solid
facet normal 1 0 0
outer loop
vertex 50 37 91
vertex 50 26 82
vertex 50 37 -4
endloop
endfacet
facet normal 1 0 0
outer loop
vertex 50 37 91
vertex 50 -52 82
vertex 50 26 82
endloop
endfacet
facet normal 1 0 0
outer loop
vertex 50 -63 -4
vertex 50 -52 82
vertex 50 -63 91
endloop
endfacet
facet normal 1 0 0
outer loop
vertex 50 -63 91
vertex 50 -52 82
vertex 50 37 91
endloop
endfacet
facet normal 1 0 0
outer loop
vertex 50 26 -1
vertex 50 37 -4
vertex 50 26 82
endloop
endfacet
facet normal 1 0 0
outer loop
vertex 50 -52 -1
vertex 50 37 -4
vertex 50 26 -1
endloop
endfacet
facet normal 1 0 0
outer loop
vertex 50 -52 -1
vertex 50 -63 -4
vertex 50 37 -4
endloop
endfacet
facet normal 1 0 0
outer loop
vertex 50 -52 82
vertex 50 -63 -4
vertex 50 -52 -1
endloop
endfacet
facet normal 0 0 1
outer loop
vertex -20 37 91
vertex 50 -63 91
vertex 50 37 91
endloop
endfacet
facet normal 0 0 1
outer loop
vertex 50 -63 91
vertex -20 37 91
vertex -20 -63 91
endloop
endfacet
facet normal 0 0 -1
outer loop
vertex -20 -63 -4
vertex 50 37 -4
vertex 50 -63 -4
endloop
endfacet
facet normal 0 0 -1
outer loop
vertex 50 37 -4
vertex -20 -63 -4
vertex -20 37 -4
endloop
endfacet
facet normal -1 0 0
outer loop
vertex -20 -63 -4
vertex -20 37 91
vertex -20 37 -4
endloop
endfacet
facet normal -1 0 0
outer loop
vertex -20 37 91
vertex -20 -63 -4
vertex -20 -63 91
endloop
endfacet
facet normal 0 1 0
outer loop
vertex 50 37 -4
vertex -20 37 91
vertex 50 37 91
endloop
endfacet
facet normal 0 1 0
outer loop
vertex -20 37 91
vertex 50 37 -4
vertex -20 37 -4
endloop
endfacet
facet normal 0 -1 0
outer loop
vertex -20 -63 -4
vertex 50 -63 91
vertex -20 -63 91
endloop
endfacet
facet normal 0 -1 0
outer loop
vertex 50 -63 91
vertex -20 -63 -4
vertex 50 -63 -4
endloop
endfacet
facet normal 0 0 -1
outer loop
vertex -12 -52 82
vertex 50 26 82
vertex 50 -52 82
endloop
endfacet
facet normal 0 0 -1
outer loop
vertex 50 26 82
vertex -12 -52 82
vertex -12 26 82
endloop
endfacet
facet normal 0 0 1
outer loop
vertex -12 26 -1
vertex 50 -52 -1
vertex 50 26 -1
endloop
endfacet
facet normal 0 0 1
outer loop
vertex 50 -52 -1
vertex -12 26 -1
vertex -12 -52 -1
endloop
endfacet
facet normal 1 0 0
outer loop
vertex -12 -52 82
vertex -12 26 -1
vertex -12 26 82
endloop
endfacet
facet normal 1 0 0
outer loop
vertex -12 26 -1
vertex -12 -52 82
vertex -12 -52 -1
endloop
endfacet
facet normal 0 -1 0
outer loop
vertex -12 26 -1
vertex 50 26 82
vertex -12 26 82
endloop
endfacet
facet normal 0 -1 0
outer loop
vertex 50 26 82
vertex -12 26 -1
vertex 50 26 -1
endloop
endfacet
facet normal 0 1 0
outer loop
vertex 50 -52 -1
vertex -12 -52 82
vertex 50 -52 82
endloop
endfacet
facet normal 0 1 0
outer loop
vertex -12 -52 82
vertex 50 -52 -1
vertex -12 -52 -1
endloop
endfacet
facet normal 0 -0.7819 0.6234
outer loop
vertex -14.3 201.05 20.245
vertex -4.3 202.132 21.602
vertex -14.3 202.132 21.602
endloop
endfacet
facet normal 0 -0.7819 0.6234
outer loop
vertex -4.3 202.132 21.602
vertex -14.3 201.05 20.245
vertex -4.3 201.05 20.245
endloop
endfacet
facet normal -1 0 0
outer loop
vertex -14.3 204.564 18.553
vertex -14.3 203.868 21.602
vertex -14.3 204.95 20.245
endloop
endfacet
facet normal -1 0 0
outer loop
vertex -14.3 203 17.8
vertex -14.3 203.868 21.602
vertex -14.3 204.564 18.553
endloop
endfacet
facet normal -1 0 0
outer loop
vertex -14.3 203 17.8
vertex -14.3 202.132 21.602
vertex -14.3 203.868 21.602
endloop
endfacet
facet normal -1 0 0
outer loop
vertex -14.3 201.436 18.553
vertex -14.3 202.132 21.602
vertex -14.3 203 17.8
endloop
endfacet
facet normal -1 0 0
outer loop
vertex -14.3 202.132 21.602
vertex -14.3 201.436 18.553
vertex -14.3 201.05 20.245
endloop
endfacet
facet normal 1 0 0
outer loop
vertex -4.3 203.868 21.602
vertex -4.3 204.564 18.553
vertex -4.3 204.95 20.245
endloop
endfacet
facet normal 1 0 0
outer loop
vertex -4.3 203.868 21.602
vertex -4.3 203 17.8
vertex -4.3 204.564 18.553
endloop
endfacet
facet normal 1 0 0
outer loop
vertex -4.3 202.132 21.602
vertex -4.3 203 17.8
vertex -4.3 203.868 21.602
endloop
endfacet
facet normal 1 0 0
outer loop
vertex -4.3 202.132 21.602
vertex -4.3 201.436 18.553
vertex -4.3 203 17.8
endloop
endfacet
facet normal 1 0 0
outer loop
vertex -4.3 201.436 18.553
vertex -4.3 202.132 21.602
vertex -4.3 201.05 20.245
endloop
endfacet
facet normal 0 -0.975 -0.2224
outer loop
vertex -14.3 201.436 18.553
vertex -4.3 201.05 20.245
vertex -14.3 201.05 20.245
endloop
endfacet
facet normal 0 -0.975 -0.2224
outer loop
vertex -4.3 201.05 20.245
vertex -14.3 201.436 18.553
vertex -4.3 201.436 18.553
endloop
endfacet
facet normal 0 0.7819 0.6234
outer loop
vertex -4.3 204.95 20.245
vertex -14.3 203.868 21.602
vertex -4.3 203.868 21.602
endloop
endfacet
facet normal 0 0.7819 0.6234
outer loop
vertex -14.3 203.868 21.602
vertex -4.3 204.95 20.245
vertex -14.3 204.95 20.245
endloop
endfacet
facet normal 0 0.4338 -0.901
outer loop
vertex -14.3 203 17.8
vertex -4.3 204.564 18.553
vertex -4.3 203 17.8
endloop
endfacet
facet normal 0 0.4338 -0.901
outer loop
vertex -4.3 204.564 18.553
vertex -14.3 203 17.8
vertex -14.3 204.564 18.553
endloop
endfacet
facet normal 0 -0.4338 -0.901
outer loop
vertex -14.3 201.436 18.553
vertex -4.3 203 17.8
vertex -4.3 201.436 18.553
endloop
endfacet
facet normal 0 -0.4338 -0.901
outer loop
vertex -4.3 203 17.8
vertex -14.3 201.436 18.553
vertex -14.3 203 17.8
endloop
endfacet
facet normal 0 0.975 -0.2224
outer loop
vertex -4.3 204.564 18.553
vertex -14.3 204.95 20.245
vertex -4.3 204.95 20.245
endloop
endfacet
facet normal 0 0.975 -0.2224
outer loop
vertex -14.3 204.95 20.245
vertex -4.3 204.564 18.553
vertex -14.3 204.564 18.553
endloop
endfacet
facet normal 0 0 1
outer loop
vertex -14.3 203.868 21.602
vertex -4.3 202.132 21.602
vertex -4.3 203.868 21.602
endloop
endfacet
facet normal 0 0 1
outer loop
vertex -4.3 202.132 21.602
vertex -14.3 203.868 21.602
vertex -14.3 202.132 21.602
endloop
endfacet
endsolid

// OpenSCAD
//change placement of cylinder marker
a1= 35.7;    //changing x-axis
a2=3;      //changing y-axis
a3= -39.8;   //changing z-axis

//change placement of ear values
h1=-50; //changing x
h2=200; //changing y
h3=-20; //changing z



difference(){ 
translate([-20,-63,-4])cube([70,100,95]);
translate([-12,-52,-1])cube([70,78,83]);
    };
translate([h1,h2,h3])//Insert the STL file here
    rotate([0,90,0])translate([a3,a2,a1])cylinder(10,2,2);
